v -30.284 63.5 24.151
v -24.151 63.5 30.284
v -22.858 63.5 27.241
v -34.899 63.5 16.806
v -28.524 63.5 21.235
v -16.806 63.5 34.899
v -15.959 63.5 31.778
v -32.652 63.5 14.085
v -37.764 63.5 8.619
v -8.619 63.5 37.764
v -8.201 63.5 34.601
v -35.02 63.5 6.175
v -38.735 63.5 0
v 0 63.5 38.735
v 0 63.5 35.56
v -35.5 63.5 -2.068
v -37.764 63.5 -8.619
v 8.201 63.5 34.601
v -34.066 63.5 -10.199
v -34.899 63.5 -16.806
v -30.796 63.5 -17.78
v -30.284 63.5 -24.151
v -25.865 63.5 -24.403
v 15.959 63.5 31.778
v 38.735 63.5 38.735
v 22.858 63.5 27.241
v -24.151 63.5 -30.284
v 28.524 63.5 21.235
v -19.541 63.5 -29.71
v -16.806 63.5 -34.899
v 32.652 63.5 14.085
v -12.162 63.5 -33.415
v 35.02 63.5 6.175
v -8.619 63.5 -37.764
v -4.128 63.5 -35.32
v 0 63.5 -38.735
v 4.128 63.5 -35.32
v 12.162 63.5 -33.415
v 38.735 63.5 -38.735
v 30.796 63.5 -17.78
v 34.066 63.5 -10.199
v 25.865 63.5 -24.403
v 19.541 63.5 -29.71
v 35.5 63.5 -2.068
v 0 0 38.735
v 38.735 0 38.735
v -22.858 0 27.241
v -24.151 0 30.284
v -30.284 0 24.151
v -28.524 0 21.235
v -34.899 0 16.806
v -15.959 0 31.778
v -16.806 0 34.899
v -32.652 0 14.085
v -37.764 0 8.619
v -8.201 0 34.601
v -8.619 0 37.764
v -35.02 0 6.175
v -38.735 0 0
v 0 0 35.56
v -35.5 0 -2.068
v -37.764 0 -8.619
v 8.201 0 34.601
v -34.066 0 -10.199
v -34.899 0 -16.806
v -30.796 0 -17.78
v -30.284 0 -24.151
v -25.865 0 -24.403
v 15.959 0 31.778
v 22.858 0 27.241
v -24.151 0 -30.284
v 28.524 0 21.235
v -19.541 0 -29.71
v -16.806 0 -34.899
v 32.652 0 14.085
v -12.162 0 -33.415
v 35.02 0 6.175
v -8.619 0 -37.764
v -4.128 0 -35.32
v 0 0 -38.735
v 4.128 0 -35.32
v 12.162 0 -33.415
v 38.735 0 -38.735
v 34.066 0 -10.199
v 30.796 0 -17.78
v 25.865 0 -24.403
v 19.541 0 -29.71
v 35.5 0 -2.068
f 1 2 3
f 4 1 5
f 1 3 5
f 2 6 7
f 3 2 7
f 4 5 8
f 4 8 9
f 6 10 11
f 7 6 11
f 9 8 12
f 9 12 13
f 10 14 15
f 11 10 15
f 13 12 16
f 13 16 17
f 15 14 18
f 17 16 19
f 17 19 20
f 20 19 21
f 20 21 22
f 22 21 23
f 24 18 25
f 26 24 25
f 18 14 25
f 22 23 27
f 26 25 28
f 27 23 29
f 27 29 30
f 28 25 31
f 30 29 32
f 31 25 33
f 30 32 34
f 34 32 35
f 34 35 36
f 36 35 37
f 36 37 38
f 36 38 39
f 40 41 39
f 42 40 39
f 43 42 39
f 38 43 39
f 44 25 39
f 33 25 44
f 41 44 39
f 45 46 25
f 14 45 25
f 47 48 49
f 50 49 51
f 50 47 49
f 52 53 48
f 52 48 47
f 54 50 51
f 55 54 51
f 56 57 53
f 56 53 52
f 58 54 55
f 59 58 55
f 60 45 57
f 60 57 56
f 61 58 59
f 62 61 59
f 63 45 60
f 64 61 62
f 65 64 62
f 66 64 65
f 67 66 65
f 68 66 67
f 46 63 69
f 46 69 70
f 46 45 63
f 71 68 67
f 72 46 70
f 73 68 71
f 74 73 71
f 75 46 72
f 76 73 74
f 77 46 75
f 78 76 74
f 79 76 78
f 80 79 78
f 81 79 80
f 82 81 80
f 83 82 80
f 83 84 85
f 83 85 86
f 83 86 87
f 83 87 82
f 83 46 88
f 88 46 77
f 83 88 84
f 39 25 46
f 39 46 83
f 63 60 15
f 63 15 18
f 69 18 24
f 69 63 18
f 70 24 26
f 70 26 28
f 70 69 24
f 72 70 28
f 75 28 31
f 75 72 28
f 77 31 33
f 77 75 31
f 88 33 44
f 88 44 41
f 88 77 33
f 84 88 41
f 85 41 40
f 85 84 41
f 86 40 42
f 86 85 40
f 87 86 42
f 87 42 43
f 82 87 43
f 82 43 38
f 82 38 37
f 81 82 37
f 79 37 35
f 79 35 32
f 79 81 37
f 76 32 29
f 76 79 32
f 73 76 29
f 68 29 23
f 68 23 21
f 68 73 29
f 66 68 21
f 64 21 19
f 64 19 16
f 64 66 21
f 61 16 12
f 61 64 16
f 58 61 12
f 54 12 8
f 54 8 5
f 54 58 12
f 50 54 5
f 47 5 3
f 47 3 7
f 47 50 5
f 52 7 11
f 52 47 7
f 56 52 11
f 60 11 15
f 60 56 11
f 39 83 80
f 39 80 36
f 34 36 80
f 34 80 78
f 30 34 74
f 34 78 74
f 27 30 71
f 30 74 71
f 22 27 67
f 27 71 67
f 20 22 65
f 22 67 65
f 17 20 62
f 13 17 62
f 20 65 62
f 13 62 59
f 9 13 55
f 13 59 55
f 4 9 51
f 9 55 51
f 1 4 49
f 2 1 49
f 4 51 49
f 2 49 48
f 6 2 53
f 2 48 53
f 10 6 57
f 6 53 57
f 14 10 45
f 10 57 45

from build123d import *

# Parameters (mm, degrees)
SKETCH1_R                = 38.735
SKETCH1_R_2              = 35.56
BOSS_EXTRUDE1_DEPTH      = 63.5
BOSS_EXTRUDE2_REACH      = 109.398
BOSS_EXTRUDE2_END_RADIUS = 38.735
SKETCH2_W                = 77.47
SKETCH2_H                = 63.5


with BuildPart() as part:
    # Sketch1 → Boss-Extrude1 (new body)
    with BuildSketch(Plane(origin=(0, 0, 0), x_dir=(1, 0, 0), z_dir=(0, 1, 0))):
        with Locations(Location((0, 0, 0), (0, 0, 270))):
            Circle(SKETCH1_R)
        with Locations(Location((0, 0, 0), (0, 0, 270))):
            Circle(SKETCH1_R_2, mode=Mode.SUBTRACT)
    extrude(amount=BOSS_EXTRUDE1_DEPTH)

    # Boss-Extrude2: up to this cylinder (the profile starts outside it)
    boss_extrude2_end = Plane(origin=(0, 31.75, 0), z_dir=(0, -1, 0)) * Cylinder(BOSS_EXTRUDE2_END_RADIUS, 297.266, mode=Mode.PRIVATE)
    # Sketch2 → Boss-Extrude2 (add, up to the surface)
    with BuildSketch(Plane(origin=(38.735, 0, 0), x_dir=(0, 0, -1), z_dir=(1, 0, 0)), mode=Mode.PRIVATE) as boss_extrude2_sk1:
        with Locations((0, 31.75)):
            Rectangle(SKETCH2_W, SKETCH2_H)
    boss_extrude2_tool1 = extrude(boss_extrude2_sk1.sketch, amount=-BOSS_EXTRUDE2_REACH, mode=Mode.PRIVATE) - boss_extrude2_end
    add(boss_extrude2_tool1.solids().sort_by_distance((38.735, 31.75, 0))[0])
    add(boss_extrude2_tool1.solids().sort_by_distance((38.735, 31.75, 0))[1])


solid = part.part
